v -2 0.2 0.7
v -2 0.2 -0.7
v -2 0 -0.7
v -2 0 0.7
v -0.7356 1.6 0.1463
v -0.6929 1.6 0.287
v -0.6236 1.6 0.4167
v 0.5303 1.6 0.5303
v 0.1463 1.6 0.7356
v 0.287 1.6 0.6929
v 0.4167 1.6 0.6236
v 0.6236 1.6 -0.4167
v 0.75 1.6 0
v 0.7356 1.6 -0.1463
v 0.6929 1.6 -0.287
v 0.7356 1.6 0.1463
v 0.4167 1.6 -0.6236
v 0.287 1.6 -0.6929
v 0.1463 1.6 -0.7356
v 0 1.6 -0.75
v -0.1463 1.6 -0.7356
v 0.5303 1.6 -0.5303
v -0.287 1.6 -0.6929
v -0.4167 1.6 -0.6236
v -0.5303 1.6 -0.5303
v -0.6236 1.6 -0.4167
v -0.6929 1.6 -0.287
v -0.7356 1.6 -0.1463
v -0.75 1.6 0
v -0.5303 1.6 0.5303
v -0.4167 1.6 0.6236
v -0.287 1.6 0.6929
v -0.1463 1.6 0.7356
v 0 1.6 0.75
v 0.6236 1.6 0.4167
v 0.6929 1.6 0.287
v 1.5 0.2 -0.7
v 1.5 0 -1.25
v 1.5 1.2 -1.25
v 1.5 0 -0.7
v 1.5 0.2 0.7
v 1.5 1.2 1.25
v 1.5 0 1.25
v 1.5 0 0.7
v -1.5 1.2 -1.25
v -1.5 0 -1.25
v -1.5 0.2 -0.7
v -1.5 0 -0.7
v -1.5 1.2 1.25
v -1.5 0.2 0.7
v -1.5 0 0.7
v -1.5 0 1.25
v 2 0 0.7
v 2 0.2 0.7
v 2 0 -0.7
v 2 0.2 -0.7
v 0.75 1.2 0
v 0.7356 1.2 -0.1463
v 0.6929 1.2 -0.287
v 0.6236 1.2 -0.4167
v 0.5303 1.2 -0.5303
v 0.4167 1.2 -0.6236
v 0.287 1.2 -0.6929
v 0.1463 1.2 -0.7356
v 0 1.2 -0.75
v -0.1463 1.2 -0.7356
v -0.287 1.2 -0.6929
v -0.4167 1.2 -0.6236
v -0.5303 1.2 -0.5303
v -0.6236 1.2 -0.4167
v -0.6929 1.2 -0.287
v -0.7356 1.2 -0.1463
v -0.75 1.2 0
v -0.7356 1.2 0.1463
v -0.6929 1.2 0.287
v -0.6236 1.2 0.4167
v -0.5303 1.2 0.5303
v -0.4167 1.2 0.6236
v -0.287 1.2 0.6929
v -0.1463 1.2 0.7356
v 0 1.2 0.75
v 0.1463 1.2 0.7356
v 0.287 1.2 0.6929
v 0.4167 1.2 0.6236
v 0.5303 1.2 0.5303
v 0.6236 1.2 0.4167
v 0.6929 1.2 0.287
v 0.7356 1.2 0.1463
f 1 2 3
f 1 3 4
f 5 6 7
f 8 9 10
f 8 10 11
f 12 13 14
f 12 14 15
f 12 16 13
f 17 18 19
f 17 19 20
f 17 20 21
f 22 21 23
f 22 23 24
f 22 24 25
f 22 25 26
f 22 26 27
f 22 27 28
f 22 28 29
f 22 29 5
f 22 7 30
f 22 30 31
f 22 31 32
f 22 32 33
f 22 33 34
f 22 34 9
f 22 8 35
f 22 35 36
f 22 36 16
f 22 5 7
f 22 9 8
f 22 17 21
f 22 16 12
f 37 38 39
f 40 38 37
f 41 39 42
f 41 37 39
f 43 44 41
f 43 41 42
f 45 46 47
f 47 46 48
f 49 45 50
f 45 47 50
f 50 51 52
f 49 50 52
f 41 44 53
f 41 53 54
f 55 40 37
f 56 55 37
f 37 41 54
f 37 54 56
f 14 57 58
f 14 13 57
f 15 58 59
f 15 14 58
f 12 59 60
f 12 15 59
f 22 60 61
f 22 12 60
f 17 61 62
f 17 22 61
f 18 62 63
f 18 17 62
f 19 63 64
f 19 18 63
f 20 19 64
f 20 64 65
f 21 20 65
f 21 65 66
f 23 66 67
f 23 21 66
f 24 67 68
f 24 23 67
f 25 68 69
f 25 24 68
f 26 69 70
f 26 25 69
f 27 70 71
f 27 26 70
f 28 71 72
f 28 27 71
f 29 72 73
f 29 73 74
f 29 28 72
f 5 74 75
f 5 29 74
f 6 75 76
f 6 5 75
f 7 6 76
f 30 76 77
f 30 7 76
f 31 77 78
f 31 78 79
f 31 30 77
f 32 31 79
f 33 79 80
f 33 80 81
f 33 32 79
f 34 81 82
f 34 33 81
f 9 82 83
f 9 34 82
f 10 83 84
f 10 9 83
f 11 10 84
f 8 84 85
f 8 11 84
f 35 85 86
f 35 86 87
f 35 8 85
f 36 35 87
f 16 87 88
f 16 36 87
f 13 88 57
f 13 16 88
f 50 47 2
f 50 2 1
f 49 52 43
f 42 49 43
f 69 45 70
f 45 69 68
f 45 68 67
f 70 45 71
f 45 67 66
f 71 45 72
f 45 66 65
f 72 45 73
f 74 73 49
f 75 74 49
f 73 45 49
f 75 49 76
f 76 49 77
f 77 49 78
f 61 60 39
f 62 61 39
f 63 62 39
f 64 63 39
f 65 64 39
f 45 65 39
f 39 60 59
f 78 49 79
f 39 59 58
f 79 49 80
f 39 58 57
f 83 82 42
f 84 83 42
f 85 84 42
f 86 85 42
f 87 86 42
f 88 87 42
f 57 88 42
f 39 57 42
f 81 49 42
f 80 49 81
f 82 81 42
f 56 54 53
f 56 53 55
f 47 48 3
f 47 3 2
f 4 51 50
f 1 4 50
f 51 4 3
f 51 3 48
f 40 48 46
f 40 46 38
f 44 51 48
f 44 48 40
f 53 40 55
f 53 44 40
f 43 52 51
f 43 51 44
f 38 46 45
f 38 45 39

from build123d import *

# Parameters (mm, degrees)
SKETCH1_W           = 3
SKETCH1_H           = 2.5
BOSS_EXTRUDE1_DEPTH = 1.2
SKETCH2_W           = 1.4
SKETCH2_H           = 0.2
BOSS_EXTRUDE2_DEPTH = 0.5
SKETCH3_W           = 1.4
SKETCH3_H           = 0.2
BOSS_EXTRUDE3_DEPTH = 0.5
SKETCH4_W           = 0.75
SKETCH4_H           = 0.4


with BuildPart() as part:
    # Sketch1 → Boss-Extrude1 (new body)
    with BuildSketch(Plane.XZ):
        Rectangle(SKETCH1_W, SKETCH1_H)
    extrude(amount=-BOSS_EXTRUDE1_DEPTH)

    # Sketch2 → Boss-Extrude2 (add)
    with BuildSketch(Plane(origin=(1.5, 0, 0), x_dir=(0, 0, -1), z_dir=(1, 0, 0))):
        with Locations((0, 0.1)):
            Rectangle(SKETCH2_W, SKETCH2_H)
    extrude(amount=BOSS_EXTRUDE2_DEPTH)

    # Sketch3 → Boss-Extrude3 (add)
    with BuildSketch(Plane.ZY.offset(1.5)):
        with Locations((0, 0.1)):
            Rectangle(SKETCH3_W, SKETCH3_H)
    extrude(amount=BOSS_EXTRUDE3_DEPTH)

    # Sketch4 → Revolve1 (revolve)
    with BuildSketch(Plane(origin=(0, 0, 0), x_dir=(-1, 0, 0), z_dir=(0, 0, -1))):
        with Locations((-0.375, 1.4)):
            Rectangle(SKETCH4_W, SKETCH4_H)
    revolve(axis=Axis((0, 1.2, 0), (0, 1, 0)))


solid = part.part
